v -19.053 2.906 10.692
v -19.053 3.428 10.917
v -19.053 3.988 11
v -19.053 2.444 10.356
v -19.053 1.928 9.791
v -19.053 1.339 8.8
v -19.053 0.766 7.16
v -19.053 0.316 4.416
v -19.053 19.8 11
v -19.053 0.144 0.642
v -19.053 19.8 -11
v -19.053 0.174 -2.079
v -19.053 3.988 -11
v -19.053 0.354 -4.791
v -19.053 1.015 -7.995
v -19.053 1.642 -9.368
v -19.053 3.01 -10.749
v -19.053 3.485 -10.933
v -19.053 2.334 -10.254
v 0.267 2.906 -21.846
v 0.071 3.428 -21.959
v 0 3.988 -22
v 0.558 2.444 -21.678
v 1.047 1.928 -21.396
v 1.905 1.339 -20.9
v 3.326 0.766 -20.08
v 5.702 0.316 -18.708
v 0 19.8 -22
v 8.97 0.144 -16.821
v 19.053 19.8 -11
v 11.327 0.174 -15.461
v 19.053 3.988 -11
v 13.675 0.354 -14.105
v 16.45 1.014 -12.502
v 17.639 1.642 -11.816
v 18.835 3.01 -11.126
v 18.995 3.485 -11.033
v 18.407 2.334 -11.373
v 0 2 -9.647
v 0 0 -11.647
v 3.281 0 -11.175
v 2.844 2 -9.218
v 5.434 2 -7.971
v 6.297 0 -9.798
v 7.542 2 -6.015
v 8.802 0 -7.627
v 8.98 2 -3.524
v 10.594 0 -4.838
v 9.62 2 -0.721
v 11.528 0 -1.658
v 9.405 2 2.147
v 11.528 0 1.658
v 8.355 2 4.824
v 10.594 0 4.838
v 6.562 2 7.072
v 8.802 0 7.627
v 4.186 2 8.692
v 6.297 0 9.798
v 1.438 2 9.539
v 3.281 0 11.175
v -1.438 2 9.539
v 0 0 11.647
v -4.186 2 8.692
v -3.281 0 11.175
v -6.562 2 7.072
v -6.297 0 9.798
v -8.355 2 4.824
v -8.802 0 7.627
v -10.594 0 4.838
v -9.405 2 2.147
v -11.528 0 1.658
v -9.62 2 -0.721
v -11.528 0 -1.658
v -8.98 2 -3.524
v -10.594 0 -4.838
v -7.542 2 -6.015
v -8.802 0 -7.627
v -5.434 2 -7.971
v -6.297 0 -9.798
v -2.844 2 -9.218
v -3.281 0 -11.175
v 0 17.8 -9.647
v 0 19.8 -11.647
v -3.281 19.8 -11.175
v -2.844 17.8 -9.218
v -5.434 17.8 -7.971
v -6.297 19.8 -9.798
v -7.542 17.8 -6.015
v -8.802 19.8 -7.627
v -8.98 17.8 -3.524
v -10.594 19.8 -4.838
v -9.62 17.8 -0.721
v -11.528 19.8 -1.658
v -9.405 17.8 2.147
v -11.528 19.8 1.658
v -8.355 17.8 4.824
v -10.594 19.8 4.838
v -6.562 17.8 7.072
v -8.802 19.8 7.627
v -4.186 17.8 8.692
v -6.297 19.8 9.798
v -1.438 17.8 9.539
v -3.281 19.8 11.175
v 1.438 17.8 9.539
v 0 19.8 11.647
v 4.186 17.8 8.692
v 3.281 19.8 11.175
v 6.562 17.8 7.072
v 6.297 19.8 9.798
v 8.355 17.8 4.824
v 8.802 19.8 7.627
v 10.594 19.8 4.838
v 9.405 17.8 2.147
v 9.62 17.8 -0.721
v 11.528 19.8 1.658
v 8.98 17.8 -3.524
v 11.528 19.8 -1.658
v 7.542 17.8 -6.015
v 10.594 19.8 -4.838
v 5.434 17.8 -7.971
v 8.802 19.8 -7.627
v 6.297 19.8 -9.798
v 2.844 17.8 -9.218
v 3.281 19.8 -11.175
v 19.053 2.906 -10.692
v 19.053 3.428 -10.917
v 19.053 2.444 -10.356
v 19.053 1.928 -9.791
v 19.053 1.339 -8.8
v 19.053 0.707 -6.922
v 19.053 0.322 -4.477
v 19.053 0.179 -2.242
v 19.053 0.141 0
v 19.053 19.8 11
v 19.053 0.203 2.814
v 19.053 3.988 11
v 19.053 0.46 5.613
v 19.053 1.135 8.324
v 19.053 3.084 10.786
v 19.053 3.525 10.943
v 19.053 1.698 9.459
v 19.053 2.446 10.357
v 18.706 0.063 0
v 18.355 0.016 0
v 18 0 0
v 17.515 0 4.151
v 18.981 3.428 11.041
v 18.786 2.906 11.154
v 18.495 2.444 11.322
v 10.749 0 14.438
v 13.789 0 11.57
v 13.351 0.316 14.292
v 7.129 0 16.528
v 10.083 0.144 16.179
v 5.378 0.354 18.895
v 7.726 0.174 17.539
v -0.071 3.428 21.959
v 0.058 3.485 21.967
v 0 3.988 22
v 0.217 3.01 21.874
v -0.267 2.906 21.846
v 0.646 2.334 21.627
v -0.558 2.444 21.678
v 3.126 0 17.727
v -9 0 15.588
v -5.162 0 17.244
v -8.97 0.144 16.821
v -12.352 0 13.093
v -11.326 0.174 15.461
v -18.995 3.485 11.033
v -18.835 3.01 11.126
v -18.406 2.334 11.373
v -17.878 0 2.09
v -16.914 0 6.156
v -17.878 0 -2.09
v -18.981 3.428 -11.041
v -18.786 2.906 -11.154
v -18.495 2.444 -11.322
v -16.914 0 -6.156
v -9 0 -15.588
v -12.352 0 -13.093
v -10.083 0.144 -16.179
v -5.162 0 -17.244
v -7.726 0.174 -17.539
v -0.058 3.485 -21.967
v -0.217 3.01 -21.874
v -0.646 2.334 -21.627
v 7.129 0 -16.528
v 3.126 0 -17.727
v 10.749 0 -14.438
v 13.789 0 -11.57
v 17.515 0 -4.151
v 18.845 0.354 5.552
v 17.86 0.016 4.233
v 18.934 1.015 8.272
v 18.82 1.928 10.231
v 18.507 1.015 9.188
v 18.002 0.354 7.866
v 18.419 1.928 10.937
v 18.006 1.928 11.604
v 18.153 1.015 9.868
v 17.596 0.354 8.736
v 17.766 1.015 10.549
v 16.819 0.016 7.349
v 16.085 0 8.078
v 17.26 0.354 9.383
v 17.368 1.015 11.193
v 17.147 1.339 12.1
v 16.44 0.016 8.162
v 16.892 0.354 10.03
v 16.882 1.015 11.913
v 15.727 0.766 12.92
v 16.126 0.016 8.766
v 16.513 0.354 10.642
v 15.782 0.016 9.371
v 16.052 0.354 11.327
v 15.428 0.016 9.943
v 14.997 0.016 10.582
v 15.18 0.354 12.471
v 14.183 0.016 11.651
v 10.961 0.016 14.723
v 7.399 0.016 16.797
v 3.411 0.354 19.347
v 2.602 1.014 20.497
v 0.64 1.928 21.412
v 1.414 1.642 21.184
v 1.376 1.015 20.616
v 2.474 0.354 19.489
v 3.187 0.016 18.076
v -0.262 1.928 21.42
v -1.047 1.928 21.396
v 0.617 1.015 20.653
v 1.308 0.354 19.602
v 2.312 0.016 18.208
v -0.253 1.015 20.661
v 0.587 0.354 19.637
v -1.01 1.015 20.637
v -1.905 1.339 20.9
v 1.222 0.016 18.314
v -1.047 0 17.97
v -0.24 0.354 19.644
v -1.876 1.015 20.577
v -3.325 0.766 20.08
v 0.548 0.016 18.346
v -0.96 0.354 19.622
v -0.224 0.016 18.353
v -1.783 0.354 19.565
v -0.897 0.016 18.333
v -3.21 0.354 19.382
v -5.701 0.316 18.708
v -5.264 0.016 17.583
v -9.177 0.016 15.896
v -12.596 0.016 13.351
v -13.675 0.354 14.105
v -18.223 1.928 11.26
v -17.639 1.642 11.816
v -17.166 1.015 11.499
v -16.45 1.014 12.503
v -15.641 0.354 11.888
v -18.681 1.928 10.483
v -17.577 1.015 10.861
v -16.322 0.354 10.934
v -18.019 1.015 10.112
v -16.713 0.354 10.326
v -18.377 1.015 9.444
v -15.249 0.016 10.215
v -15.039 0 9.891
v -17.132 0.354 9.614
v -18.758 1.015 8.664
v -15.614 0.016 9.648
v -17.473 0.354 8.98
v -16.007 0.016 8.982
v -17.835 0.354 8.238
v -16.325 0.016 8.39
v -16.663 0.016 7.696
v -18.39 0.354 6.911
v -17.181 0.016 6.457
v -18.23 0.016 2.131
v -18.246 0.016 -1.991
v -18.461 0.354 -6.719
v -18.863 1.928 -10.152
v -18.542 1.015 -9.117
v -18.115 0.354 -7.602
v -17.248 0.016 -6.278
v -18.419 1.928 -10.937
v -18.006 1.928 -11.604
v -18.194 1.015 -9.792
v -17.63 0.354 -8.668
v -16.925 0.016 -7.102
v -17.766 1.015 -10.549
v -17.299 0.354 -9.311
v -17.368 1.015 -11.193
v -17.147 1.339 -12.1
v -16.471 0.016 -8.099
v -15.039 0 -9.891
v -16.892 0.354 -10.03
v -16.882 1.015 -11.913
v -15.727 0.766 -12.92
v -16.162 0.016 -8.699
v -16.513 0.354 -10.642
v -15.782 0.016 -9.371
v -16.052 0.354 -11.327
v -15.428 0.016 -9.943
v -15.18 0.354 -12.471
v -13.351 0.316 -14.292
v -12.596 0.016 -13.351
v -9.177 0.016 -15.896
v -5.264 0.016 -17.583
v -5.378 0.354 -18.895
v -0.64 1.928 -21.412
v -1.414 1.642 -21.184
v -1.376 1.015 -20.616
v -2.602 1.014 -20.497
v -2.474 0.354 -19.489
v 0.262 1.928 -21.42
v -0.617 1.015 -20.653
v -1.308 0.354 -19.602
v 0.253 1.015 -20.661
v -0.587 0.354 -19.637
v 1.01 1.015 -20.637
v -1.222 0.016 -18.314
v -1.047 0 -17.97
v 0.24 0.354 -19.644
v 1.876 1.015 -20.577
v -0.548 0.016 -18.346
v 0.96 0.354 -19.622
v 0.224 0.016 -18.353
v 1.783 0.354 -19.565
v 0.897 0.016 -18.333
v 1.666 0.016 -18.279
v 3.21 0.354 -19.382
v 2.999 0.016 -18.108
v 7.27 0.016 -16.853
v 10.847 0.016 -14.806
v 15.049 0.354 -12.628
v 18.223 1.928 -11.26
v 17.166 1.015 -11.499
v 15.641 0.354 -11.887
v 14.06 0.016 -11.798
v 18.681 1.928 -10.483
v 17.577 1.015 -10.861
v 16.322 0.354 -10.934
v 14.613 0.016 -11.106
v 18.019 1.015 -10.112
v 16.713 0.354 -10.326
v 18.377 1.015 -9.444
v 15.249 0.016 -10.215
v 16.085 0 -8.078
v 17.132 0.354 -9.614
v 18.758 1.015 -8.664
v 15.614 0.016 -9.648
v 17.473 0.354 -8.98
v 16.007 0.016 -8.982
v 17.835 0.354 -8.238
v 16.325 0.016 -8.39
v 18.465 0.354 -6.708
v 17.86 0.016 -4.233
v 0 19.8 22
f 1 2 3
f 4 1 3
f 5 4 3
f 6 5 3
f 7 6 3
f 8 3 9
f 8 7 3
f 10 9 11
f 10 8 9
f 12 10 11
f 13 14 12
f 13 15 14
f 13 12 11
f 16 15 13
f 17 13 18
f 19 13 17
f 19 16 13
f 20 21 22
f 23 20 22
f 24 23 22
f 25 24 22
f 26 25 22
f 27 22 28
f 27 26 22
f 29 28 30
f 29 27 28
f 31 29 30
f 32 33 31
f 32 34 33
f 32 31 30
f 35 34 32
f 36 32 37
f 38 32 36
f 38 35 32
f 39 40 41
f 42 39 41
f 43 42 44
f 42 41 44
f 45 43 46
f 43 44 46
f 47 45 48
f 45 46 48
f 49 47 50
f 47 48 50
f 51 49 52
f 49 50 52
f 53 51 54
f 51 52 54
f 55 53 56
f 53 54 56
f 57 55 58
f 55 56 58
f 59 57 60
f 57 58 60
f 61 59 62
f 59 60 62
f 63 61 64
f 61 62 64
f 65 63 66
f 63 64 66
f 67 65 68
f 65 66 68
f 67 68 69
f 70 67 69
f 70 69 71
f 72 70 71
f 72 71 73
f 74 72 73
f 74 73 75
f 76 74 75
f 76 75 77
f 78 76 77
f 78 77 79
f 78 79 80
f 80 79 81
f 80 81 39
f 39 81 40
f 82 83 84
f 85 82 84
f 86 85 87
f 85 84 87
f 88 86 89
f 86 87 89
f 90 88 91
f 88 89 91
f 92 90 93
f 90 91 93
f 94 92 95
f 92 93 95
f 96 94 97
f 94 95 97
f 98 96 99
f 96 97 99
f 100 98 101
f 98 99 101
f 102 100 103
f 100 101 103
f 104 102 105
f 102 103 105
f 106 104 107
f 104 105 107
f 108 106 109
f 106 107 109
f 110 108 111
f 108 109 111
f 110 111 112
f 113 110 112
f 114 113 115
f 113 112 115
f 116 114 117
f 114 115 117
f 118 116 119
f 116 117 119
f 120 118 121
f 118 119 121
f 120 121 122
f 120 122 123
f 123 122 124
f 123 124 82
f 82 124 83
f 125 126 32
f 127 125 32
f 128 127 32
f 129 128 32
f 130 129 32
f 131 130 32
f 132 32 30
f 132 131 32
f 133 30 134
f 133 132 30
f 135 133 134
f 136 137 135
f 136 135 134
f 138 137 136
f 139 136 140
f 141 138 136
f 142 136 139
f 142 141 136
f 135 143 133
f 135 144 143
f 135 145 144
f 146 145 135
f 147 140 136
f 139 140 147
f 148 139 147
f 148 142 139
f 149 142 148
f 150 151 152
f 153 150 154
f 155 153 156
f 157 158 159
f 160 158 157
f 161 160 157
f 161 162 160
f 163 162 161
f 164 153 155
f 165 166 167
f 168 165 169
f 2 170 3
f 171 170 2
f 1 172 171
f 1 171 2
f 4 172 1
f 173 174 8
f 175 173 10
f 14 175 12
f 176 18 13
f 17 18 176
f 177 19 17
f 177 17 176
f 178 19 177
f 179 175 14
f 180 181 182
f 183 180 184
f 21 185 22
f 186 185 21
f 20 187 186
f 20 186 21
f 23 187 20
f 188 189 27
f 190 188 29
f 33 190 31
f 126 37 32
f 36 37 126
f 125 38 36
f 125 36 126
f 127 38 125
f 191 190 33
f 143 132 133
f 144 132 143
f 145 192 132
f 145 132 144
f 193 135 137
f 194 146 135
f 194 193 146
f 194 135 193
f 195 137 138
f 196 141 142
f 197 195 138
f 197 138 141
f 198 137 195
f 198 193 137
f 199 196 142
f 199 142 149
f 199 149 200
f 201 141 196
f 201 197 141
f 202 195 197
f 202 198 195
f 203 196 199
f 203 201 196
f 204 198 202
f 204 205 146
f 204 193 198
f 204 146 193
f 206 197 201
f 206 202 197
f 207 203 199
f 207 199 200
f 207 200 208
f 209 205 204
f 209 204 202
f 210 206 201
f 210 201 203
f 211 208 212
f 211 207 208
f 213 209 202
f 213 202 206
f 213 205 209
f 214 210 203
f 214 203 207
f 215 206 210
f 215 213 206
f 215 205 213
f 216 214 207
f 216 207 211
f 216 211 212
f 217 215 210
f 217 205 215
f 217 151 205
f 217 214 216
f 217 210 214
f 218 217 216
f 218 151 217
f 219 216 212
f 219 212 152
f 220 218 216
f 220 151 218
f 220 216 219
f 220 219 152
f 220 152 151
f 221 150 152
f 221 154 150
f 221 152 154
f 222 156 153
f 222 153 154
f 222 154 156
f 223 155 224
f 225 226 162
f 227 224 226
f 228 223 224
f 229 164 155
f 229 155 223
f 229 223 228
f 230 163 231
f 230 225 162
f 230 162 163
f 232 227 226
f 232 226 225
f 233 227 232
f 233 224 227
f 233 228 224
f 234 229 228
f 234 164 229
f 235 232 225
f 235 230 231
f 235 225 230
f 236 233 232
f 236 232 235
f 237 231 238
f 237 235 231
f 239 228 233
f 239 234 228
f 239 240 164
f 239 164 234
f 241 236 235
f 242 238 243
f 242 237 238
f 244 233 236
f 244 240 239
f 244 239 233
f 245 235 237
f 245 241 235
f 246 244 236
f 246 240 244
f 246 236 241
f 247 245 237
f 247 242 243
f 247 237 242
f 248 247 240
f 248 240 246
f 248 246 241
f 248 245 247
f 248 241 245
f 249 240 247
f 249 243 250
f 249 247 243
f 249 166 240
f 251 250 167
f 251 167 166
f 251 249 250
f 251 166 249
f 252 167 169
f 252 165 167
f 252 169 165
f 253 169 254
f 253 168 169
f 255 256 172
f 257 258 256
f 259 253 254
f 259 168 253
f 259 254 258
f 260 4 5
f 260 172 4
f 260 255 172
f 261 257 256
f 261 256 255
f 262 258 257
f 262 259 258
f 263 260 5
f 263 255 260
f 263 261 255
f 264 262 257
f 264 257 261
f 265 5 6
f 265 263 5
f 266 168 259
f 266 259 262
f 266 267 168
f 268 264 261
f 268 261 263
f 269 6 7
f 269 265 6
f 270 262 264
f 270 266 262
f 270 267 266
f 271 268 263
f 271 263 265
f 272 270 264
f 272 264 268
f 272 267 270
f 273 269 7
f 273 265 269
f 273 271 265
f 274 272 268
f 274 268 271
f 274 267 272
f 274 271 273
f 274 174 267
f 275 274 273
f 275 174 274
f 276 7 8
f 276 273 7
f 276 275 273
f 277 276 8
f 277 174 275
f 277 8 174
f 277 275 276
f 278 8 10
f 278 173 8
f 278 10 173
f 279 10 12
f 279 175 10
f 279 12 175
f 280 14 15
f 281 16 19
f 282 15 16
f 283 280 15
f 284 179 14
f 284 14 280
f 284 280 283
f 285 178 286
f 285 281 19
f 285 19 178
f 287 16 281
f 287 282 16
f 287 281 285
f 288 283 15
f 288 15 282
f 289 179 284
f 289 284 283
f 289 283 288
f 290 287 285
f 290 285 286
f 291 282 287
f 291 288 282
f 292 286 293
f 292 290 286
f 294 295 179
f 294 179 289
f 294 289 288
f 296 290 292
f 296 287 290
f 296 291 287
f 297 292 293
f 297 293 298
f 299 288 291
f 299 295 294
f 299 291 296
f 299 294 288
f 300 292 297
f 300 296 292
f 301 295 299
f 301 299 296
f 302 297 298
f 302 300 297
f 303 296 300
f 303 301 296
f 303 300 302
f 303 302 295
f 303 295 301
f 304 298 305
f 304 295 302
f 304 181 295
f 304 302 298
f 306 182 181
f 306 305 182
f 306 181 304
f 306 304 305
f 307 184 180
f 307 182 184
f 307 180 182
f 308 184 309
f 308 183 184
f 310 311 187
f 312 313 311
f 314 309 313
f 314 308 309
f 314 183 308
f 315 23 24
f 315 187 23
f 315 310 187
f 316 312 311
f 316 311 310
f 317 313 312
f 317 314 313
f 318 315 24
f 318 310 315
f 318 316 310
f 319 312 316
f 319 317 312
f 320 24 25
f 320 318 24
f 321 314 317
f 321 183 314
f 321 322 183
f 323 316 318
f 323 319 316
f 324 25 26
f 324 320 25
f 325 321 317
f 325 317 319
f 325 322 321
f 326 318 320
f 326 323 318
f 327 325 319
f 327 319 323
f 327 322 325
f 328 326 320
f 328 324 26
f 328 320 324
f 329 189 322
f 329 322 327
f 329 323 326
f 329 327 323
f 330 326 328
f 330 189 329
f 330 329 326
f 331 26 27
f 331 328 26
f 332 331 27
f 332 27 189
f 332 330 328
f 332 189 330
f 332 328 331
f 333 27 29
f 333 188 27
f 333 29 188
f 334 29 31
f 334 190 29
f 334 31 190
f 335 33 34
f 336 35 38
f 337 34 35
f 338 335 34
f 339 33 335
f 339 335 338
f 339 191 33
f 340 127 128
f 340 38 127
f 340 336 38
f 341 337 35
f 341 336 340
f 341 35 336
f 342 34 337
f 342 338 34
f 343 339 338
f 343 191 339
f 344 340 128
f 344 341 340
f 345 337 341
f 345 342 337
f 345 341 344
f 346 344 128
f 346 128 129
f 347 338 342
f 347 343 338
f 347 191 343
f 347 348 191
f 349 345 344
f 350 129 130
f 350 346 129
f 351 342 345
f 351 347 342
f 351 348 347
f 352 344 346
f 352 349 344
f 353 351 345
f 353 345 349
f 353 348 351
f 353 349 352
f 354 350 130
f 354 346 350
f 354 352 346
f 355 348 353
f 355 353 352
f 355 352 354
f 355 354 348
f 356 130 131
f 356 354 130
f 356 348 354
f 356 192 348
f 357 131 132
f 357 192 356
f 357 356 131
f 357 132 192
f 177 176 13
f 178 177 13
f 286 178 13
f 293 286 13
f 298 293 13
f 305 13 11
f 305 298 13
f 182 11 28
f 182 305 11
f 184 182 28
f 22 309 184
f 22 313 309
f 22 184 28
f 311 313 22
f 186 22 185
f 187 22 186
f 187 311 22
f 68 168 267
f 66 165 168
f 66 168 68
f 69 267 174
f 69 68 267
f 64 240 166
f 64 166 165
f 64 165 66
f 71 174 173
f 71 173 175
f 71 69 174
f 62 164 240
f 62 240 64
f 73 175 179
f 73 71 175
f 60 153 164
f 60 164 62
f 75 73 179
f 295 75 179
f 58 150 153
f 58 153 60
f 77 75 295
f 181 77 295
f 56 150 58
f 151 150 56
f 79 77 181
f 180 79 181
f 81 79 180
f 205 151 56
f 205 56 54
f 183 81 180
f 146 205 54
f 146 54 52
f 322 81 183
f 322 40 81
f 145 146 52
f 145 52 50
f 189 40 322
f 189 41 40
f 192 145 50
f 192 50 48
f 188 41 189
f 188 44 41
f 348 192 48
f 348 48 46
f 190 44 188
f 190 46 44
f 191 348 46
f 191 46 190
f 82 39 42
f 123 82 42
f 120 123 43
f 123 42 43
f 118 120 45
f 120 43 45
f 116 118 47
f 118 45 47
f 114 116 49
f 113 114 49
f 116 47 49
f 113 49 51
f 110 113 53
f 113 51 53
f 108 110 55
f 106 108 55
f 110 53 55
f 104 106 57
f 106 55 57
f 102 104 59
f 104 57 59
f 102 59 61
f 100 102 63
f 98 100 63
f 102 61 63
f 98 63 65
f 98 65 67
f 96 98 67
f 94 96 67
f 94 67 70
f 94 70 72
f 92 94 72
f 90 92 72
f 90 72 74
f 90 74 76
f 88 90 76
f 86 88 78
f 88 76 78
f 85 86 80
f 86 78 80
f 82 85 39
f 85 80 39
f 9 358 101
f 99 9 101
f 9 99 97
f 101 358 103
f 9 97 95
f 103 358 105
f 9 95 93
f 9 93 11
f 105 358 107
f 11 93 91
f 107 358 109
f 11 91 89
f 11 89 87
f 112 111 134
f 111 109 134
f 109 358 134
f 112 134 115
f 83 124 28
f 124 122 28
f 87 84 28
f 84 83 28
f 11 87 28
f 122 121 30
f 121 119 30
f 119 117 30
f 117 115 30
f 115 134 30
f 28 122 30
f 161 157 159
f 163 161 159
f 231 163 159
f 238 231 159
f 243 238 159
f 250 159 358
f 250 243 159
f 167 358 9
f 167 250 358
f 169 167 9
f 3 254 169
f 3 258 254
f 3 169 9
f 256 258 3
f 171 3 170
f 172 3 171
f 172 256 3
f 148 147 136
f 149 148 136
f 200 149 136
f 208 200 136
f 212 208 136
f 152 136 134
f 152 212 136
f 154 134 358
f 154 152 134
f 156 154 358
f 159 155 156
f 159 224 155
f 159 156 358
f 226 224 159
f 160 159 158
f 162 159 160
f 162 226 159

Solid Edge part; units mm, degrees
sketch "Sketch1" plane through (0, 0, 0) normal (0, -1, 0) x (1, 0, 0)
  circle A0 centre (0, 0) radius 22
extrude "Protrusion1" add sketch "Sketch1" against normal blind 19.8
fillet "Round_1" radius 4 1 edges at (-22, 0, 0)
sketch "Sketch2" plane through (0, 0, 0) normal (0, -1, 0) x (1, 0, 0)
  line L0 (0, 22) -> (-19.0525, 11)
extrude "ExtrudedCutout_1" cut sketch "Sketch2" against normal blind 127.8388 material side at (-9.5513, 0, 16.5433)
pattern_circular "Pattern1" count 6 over 360 about axis through (0, 0, 0) along (0, -1, 0) of "ExtrudedCutout_1"
hole "Hole_1" at (0, 0, 0) direction (0, 1, 0) diameter 19.294 end up to next
chamfer "Chamfer_1" distance 2 angle 45 2 edges at (-9.647, 0, 0) (0, 19.8, -9.647)
